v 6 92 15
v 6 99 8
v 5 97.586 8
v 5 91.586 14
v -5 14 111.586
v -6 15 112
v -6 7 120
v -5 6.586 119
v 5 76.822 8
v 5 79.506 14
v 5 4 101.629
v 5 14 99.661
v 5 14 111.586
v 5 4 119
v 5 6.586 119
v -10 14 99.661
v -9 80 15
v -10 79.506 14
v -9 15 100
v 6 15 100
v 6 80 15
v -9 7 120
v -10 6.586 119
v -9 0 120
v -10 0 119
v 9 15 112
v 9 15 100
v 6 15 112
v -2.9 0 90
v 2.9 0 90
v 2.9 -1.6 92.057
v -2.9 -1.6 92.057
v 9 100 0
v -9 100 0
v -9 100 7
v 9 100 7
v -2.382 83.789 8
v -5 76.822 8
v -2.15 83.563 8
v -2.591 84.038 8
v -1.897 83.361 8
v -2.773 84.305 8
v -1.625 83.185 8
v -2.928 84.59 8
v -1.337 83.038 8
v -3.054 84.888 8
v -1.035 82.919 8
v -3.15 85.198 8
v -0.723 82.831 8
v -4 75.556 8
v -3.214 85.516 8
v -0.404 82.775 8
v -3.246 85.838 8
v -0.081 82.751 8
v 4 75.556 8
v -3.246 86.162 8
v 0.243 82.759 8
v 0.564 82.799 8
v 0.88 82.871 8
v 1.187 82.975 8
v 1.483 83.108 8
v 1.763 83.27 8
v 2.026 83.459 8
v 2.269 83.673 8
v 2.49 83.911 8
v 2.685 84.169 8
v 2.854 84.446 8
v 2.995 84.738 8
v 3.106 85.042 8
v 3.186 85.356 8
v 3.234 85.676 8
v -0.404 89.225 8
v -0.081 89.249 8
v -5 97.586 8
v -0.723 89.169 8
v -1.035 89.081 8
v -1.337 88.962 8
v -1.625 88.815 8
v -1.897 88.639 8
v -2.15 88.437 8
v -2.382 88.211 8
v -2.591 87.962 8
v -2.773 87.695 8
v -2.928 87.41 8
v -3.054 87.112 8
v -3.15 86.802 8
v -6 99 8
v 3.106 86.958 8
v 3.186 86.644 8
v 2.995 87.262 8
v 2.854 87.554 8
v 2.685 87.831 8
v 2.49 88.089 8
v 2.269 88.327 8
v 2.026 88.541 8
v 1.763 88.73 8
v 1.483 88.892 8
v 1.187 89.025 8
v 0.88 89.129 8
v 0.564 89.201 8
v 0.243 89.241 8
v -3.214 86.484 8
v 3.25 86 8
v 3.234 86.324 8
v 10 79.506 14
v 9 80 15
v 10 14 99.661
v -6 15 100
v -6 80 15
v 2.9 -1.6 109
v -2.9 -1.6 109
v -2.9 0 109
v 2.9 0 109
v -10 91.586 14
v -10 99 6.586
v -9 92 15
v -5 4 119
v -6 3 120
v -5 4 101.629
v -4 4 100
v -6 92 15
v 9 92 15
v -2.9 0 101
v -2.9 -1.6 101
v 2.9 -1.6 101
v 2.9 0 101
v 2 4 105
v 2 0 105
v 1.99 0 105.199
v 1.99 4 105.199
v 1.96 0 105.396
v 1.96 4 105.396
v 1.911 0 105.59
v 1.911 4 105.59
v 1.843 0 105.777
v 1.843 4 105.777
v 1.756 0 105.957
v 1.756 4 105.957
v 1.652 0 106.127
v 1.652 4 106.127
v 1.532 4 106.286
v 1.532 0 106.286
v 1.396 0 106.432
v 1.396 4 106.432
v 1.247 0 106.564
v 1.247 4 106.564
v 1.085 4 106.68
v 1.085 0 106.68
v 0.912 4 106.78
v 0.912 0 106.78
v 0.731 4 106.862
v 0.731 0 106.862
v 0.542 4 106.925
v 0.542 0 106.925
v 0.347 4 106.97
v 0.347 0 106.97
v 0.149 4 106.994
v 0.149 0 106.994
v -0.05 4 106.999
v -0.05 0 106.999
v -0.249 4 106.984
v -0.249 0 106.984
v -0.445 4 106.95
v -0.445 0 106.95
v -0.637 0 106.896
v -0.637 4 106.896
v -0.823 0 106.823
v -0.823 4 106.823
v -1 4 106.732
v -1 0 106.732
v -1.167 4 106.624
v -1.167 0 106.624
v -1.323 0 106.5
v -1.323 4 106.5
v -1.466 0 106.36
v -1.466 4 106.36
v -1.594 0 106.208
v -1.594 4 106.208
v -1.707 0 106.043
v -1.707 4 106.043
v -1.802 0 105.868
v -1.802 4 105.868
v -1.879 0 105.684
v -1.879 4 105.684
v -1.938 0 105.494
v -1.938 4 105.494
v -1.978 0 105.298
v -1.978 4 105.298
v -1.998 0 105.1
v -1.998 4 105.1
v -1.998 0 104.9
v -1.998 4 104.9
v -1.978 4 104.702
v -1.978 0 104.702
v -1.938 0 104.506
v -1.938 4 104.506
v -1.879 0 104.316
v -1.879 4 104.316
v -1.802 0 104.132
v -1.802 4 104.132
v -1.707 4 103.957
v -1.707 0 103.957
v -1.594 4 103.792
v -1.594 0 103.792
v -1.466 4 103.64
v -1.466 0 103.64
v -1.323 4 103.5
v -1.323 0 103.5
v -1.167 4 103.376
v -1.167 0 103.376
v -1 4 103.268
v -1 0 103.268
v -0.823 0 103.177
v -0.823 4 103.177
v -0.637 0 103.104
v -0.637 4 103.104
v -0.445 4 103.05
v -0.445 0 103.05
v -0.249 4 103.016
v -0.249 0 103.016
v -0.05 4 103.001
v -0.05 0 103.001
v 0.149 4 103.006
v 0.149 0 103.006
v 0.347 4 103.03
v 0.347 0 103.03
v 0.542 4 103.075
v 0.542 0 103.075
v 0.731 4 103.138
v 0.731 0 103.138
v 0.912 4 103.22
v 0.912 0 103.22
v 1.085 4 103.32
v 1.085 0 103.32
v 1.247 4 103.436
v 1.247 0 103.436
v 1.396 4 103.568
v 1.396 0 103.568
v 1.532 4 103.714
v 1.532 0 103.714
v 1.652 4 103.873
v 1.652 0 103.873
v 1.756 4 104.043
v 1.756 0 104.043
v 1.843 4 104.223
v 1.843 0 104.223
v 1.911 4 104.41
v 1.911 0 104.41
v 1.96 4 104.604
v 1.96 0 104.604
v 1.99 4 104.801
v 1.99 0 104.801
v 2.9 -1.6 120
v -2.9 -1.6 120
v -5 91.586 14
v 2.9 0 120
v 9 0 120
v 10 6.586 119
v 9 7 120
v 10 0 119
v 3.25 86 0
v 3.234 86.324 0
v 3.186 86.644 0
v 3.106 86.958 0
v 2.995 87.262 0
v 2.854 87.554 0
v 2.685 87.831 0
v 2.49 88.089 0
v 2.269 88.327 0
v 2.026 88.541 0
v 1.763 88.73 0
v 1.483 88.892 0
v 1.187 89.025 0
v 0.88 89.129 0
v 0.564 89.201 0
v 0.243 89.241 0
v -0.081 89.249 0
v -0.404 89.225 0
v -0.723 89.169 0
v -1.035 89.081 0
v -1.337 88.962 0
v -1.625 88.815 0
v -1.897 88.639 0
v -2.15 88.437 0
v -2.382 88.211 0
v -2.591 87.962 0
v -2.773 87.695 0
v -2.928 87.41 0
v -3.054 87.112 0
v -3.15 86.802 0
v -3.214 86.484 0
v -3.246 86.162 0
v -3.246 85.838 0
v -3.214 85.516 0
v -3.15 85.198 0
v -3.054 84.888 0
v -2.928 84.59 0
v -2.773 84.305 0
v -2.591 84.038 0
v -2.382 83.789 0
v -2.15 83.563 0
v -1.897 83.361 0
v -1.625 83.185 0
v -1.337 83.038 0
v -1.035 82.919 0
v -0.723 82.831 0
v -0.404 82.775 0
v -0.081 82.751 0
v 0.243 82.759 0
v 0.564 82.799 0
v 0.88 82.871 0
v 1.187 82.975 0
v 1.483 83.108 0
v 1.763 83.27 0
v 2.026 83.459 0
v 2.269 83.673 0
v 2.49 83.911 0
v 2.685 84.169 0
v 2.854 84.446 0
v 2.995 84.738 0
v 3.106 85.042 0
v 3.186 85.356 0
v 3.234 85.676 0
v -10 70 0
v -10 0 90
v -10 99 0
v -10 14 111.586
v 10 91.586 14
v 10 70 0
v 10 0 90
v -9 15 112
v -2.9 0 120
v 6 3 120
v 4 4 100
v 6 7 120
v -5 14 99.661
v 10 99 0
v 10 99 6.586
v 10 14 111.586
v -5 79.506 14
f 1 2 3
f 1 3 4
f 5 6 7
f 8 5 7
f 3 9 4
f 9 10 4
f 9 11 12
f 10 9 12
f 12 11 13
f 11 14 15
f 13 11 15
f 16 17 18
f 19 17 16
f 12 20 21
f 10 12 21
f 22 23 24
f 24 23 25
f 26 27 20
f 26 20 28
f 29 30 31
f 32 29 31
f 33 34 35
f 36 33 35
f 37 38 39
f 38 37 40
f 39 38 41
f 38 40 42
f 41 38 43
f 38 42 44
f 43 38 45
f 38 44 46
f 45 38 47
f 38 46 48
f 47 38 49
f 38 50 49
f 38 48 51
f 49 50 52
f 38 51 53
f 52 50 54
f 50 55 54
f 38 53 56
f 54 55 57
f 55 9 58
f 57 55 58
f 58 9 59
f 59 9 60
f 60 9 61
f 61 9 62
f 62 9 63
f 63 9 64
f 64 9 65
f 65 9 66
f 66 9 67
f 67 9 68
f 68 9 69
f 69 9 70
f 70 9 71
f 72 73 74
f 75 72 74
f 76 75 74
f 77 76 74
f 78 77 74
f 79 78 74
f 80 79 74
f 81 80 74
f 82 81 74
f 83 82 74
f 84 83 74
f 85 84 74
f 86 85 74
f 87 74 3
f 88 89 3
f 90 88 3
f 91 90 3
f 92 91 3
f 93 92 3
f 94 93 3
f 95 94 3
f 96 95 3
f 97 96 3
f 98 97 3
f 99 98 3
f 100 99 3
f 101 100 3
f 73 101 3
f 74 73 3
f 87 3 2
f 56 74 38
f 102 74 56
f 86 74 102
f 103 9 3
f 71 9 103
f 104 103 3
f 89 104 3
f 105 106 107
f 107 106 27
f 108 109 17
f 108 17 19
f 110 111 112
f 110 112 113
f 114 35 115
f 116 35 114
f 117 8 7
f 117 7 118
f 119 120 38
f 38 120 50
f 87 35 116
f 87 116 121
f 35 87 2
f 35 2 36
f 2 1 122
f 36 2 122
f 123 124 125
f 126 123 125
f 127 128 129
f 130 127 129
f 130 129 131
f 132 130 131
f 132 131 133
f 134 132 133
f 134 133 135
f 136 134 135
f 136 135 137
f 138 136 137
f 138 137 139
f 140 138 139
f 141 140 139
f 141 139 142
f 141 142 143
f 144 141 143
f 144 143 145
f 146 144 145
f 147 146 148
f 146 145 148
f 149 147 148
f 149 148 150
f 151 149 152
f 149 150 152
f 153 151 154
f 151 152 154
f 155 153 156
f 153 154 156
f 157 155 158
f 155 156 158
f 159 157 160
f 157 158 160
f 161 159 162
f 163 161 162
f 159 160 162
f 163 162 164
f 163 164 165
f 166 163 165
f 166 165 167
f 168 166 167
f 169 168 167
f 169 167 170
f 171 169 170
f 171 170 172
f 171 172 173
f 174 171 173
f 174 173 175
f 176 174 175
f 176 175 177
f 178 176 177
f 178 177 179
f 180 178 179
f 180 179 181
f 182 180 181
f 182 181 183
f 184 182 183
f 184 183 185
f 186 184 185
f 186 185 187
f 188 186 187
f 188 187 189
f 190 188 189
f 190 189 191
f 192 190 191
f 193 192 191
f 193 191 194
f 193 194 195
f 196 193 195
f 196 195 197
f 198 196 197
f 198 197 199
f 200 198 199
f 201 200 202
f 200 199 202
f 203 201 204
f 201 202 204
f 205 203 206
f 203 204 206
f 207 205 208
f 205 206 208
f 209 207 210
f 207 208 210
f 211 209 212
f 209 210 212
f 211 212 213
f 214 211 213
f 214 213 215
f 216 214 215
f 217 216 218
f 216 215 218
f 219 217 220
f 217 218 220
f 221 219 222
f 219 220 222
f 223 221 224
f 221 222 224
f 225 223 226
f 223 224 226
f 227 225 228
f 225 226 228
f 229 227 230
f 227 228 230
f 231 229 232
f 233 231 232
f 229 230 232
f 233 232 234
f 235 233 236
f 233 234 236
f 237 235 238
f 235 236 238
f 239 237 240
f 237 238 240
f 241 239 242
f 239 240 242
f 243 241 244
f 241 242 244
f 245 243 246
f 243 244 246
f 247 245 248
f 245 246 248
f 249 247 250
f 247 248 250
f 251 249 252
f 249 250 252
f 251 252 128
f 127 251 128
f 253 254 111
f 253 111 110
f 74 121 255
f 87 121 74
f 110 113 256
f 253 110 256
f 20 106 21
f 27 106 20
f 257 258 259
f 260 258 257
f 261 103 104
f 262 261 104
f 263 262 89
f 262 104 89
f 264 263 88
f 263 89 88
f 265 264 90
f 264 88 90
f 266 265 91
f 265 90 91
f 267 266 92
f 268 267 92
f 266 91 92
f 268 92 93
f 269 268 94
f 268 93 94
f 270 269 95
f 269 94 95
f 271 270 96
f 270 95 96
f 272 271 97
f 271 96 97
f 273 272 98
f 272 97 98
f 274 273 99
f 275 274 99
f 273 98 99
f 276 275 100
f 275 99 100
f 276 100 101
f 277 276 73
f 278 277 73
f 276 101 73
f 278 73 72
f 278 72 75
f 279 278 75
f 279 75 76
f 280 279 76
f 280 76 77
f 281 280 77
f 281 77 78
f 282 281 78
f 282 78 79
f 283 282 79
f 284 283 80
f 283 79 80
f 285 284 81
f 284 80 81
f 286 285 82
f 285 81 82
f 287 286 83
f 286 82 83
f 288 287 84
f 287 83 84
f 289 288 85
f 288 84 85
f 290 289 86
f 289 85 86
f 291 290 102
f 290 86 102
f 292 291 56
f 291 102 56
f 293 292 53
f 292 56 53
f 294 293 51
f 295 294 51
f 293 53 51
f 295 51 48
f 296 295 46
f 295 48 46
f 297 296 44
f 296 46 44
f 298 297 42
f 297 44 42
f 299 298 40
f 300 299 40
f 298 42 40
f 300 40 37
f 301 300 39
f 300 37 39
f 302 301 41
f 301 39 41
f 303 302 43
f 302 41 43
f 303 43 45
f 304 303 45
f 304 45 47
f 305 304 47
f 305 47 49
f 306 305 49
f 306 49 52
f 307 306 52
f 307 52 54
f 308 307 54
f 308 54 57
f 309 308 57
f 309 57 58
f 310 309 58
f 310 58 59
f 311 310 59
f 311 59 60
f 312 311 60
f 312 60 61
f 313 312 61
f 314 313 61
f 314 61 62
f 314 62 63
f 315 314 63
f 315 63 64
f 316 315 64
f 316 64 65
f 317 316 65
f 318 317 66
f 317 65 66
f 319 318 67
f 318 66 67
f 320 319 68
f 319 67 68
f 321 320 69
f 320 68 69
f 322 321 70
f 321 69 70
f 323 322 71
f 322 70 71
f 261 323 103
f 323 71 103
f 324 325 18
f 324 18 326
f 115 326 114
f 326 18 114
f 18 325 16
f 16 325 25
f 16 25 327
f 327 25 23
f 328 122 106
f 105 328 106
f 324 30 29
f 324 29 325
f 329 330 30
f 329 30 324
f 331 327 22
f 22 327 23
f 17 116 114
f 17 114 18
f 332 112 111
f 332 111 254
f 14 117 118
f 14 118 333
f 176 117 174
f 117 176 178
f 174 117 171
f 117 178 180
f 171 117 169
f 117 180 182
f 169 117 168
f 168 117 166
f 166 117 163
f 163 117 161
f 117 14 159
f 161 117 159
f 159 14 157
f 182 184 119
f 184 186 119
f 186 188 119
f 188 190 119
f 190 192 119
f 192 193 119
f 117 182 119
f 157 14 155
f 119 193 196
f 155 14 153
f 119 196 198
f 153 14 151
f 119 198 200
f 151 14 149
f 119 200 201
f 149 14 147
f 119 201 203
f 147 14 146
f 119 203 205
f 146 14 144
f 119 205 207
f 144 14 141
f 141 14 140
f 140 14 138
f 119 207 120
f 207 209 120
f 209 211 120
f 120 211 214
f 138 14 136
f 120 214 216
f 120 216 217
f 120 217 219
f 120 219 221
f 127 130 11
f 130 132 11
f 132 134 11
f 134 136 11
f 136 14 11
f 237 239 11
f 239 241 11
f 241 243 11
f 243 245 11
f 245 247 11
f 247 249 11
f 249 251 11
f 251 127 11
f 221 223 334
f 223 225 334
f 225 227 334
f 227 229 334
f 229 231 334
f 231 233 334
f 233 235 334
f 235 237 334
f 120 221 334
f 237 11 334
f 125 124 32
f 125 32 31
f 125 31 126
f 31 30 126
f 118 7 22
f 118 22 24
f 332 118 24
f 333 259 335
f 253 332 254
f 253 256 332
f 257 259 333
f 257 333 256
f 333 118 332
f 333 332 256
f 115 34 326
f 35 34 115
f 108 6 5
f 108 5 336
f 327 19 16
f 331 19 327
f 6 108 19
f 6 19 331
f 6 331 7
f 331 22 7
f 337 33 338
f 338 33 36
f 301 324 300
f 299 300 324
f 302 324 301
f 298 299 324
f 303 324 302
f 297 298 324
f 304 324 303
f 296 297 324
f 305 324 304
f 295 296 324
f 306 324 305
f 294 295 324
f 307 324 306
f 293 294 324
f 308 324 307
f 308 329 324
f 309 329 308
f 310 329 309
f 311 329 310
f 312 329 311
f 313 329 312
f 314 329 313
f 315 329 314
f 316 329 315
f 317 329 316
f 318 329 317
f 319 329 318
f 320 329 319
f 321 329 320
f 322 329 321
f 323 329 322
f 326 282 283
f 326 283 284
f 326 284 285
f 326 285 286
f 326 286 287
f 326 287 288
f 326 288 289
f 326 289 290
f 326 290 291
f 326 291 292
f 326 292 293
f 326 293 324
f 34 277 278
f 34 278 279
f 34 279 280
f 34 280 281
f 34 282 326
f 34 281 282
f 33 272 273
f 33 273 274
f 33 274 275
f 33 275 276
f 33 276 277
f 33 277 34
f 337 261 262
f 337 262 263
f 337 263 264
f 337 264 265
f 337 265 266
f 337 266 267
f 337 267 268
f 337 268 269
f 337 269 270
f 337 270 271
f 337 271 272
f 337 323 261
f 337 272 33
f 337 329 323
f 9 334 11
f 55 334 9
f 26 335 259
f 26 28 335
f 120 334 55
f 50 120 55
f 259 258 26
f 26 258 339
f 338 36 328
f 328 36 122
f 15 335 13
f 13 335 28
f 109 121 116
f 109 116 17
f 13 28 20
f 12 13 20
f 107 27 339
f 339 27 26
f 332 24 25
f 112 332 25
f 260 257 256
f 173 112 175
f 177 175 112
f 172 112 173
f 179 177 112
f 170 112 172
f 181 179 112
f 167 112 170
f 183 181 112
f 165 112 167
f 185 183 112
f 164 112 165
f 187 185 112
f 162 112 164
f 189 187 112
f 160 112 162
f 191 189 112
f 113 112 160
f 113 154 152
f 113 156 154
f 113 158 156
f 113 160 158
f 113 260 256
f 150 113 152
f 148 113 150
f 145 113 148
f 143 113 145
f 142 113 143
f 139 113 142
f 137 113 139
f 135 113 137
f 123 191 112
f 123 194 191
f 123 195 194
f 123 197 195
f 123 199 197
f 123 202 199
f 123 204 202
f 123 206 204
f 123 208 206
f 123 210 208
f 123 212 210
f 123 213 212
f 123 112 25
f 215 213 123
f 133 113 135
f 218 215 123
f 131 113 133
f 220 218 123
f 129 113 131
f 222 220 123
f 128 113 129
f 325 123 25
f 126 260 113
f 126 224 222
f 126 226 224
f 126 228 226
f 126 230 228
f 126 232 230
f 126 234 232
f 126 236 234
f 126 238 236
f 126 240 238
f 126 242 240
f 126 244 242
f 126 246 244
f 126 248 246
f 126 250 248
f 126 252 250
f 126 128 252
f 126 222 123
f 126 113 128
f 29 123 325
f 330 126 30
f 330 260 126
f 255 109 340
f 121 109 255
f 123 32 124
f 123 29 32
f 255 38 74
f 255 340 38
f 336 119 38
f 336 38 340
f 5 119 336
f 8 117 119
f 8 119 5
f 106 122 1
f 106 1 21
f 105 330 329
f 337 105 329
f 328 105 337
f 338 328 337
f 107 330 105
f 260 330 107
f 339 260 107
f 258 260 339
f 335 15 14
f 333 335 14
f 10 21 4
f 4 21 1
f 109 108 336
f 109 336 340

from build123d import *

# Parameters (mm, degrees)
F1_DEPTH    = 10
F2_W        = 5.8
F2_H        = 30
F3_DEPTH    = 1.6
F4_W        = 5.8
F4_H        = 8
F5_DEPTH    = 1.6
F6_R        = 2
F7_DEPTH    = 15
F9_DEPTH    = 5
F10_R       = 3.25
F11_DEPTH   = 8
F13_DEPTH   = 5.8
F14_C1_SIZE = 8
F14_C2_SIZE = 8
F14_C3_SIZE = 8
F15_SIZE    = 1


with BuildPart() as f1:
    # F0 (on Right) → F1 (new body, symmetric)
    with BuildSketch(Plane.YZ):
        Polygon((70, 0), (100, 0), (100, 15), (80, 15), (15, 100), (15, 120), (0, 120), (0, 90), align=None)
    extrude(amount=F1_DEPTH, both=True)

    # F2 (on face) → F3 (join)
    with BuildSketch(Plane.XZ):
        with Locations((0, 105)):
            Rectangle(F2_W, F2_H)
    extrude(amount=F3_DEPTH)

    # F4 (on face) → F5 (cut, through all)
    with BuildSketch(Plane.XZ.offset(1.6)):
        with Locations((0, 105)):
            Rectangle(F4_W, F4_H)
    extrude(amount=-F5_DEPTH, mode=Mode.SUBTRACT)

    # F6 (on face) → F7 (cut, through all)
    with BuildSketch(Plane.XZ):
        with Locations((0, 105)):
            Circle(F6_R)
    extrude(amount=-F7_DEPTH, mode=Mode.SUBTRACT)

    # F8 (on Right) → F9 (cut, symmetric)
    with BuildSketch(Plane.YZ):
        Polygon((21.8223074079, 120), (4, 120), (4, 100), (75.5555555556, 8), (100, 8), (100, 19.4858238101), align=None)
    extrude(amount=F9_DEPTH, both=True, mode=Mode.SUBTRACT)

    # F10 (on face) → F11 (cut, through all)
    with BuildSketch(Plane.XY.offset(8)):
        with Locations((0, 86)):
            Circle(F10_R)
    extrude(amount=-F11_DEPTH, mode=Mode.SUBTRACT)

    # F12 (on face) → F13 (cut, through all)
    with BuildSketch(Plane.YZ.offset(2.9)):
        Polygon((-1.6, 90), (0, 90), (-1.6, 92.0571428571), align=None)
    extrude(amount=-F13_DEPTH, mode=Mode.SUBTRACT)

    # F14: chamfer of 8 on 4 edges, made by hand

    # F14_c1
    f14_c1_edges = [f1.edges().sort_by_distance(p)[0] for p in [
        (7.5, 100, 15),
    ]]
    chamfer(f14_c1_edges, length=F14_C1_SIZE)

    # F14_c2
    f14_c2_edges = [f1.edges().sort_by_distance(p)[0] for p in [
        (-7.5, 15, 120),
    ]]
    chamfer(f14_c2_edges, length=F14_C2_SIZE)

    # F14_c3
    f14_c3_edges = [f1.edges().sort_by_distance(p)[0] for p in [
        (7.5, 15, 120),
    ]]
    chamfer(f14_c3_edges, length=F14_C3_SIZE)

    # F15
    f15_edges = [f1.edges().sort_by_distance(p)[0] for p in [
        (10, 47.5, 57.5),
        (5, 47.5, 57.5),
        (10, 15, 106),
        (5, 15, 106),
        (-5, 15, 106),
        (-10, 15, 106),
        (-5, 47.5, 57.5),
        (-10, 47.5, 57.5),
        (10, 86, 15),
        (5, 86, 15),
        (-5, 86, 15),
        (-10, 86, 15),
        (-10, 100, 3.5),
        (10, 100, 3.5),
        (10, 3.5, 120),
        (5, 5.5, 120),
        (-5, 5.5, 120),
        (-10, 3.5, 120),
        (0, 4, 120),
        (5, 39.777778, 54),
        (-5, 39.777778, 54),
        (10, 96, 11),
        (5, 95.5, 11.5),
        (-5, 95.5, 11.5),
        (-10, 96, 11),
        (10, 11, 116),
        (5, 11, 116),
        (-5, 11, 116),
        (-10, 11, 116),
    ]]
    chamfer(f15_edges, length=F15_SIZE)


solid = f1.part
